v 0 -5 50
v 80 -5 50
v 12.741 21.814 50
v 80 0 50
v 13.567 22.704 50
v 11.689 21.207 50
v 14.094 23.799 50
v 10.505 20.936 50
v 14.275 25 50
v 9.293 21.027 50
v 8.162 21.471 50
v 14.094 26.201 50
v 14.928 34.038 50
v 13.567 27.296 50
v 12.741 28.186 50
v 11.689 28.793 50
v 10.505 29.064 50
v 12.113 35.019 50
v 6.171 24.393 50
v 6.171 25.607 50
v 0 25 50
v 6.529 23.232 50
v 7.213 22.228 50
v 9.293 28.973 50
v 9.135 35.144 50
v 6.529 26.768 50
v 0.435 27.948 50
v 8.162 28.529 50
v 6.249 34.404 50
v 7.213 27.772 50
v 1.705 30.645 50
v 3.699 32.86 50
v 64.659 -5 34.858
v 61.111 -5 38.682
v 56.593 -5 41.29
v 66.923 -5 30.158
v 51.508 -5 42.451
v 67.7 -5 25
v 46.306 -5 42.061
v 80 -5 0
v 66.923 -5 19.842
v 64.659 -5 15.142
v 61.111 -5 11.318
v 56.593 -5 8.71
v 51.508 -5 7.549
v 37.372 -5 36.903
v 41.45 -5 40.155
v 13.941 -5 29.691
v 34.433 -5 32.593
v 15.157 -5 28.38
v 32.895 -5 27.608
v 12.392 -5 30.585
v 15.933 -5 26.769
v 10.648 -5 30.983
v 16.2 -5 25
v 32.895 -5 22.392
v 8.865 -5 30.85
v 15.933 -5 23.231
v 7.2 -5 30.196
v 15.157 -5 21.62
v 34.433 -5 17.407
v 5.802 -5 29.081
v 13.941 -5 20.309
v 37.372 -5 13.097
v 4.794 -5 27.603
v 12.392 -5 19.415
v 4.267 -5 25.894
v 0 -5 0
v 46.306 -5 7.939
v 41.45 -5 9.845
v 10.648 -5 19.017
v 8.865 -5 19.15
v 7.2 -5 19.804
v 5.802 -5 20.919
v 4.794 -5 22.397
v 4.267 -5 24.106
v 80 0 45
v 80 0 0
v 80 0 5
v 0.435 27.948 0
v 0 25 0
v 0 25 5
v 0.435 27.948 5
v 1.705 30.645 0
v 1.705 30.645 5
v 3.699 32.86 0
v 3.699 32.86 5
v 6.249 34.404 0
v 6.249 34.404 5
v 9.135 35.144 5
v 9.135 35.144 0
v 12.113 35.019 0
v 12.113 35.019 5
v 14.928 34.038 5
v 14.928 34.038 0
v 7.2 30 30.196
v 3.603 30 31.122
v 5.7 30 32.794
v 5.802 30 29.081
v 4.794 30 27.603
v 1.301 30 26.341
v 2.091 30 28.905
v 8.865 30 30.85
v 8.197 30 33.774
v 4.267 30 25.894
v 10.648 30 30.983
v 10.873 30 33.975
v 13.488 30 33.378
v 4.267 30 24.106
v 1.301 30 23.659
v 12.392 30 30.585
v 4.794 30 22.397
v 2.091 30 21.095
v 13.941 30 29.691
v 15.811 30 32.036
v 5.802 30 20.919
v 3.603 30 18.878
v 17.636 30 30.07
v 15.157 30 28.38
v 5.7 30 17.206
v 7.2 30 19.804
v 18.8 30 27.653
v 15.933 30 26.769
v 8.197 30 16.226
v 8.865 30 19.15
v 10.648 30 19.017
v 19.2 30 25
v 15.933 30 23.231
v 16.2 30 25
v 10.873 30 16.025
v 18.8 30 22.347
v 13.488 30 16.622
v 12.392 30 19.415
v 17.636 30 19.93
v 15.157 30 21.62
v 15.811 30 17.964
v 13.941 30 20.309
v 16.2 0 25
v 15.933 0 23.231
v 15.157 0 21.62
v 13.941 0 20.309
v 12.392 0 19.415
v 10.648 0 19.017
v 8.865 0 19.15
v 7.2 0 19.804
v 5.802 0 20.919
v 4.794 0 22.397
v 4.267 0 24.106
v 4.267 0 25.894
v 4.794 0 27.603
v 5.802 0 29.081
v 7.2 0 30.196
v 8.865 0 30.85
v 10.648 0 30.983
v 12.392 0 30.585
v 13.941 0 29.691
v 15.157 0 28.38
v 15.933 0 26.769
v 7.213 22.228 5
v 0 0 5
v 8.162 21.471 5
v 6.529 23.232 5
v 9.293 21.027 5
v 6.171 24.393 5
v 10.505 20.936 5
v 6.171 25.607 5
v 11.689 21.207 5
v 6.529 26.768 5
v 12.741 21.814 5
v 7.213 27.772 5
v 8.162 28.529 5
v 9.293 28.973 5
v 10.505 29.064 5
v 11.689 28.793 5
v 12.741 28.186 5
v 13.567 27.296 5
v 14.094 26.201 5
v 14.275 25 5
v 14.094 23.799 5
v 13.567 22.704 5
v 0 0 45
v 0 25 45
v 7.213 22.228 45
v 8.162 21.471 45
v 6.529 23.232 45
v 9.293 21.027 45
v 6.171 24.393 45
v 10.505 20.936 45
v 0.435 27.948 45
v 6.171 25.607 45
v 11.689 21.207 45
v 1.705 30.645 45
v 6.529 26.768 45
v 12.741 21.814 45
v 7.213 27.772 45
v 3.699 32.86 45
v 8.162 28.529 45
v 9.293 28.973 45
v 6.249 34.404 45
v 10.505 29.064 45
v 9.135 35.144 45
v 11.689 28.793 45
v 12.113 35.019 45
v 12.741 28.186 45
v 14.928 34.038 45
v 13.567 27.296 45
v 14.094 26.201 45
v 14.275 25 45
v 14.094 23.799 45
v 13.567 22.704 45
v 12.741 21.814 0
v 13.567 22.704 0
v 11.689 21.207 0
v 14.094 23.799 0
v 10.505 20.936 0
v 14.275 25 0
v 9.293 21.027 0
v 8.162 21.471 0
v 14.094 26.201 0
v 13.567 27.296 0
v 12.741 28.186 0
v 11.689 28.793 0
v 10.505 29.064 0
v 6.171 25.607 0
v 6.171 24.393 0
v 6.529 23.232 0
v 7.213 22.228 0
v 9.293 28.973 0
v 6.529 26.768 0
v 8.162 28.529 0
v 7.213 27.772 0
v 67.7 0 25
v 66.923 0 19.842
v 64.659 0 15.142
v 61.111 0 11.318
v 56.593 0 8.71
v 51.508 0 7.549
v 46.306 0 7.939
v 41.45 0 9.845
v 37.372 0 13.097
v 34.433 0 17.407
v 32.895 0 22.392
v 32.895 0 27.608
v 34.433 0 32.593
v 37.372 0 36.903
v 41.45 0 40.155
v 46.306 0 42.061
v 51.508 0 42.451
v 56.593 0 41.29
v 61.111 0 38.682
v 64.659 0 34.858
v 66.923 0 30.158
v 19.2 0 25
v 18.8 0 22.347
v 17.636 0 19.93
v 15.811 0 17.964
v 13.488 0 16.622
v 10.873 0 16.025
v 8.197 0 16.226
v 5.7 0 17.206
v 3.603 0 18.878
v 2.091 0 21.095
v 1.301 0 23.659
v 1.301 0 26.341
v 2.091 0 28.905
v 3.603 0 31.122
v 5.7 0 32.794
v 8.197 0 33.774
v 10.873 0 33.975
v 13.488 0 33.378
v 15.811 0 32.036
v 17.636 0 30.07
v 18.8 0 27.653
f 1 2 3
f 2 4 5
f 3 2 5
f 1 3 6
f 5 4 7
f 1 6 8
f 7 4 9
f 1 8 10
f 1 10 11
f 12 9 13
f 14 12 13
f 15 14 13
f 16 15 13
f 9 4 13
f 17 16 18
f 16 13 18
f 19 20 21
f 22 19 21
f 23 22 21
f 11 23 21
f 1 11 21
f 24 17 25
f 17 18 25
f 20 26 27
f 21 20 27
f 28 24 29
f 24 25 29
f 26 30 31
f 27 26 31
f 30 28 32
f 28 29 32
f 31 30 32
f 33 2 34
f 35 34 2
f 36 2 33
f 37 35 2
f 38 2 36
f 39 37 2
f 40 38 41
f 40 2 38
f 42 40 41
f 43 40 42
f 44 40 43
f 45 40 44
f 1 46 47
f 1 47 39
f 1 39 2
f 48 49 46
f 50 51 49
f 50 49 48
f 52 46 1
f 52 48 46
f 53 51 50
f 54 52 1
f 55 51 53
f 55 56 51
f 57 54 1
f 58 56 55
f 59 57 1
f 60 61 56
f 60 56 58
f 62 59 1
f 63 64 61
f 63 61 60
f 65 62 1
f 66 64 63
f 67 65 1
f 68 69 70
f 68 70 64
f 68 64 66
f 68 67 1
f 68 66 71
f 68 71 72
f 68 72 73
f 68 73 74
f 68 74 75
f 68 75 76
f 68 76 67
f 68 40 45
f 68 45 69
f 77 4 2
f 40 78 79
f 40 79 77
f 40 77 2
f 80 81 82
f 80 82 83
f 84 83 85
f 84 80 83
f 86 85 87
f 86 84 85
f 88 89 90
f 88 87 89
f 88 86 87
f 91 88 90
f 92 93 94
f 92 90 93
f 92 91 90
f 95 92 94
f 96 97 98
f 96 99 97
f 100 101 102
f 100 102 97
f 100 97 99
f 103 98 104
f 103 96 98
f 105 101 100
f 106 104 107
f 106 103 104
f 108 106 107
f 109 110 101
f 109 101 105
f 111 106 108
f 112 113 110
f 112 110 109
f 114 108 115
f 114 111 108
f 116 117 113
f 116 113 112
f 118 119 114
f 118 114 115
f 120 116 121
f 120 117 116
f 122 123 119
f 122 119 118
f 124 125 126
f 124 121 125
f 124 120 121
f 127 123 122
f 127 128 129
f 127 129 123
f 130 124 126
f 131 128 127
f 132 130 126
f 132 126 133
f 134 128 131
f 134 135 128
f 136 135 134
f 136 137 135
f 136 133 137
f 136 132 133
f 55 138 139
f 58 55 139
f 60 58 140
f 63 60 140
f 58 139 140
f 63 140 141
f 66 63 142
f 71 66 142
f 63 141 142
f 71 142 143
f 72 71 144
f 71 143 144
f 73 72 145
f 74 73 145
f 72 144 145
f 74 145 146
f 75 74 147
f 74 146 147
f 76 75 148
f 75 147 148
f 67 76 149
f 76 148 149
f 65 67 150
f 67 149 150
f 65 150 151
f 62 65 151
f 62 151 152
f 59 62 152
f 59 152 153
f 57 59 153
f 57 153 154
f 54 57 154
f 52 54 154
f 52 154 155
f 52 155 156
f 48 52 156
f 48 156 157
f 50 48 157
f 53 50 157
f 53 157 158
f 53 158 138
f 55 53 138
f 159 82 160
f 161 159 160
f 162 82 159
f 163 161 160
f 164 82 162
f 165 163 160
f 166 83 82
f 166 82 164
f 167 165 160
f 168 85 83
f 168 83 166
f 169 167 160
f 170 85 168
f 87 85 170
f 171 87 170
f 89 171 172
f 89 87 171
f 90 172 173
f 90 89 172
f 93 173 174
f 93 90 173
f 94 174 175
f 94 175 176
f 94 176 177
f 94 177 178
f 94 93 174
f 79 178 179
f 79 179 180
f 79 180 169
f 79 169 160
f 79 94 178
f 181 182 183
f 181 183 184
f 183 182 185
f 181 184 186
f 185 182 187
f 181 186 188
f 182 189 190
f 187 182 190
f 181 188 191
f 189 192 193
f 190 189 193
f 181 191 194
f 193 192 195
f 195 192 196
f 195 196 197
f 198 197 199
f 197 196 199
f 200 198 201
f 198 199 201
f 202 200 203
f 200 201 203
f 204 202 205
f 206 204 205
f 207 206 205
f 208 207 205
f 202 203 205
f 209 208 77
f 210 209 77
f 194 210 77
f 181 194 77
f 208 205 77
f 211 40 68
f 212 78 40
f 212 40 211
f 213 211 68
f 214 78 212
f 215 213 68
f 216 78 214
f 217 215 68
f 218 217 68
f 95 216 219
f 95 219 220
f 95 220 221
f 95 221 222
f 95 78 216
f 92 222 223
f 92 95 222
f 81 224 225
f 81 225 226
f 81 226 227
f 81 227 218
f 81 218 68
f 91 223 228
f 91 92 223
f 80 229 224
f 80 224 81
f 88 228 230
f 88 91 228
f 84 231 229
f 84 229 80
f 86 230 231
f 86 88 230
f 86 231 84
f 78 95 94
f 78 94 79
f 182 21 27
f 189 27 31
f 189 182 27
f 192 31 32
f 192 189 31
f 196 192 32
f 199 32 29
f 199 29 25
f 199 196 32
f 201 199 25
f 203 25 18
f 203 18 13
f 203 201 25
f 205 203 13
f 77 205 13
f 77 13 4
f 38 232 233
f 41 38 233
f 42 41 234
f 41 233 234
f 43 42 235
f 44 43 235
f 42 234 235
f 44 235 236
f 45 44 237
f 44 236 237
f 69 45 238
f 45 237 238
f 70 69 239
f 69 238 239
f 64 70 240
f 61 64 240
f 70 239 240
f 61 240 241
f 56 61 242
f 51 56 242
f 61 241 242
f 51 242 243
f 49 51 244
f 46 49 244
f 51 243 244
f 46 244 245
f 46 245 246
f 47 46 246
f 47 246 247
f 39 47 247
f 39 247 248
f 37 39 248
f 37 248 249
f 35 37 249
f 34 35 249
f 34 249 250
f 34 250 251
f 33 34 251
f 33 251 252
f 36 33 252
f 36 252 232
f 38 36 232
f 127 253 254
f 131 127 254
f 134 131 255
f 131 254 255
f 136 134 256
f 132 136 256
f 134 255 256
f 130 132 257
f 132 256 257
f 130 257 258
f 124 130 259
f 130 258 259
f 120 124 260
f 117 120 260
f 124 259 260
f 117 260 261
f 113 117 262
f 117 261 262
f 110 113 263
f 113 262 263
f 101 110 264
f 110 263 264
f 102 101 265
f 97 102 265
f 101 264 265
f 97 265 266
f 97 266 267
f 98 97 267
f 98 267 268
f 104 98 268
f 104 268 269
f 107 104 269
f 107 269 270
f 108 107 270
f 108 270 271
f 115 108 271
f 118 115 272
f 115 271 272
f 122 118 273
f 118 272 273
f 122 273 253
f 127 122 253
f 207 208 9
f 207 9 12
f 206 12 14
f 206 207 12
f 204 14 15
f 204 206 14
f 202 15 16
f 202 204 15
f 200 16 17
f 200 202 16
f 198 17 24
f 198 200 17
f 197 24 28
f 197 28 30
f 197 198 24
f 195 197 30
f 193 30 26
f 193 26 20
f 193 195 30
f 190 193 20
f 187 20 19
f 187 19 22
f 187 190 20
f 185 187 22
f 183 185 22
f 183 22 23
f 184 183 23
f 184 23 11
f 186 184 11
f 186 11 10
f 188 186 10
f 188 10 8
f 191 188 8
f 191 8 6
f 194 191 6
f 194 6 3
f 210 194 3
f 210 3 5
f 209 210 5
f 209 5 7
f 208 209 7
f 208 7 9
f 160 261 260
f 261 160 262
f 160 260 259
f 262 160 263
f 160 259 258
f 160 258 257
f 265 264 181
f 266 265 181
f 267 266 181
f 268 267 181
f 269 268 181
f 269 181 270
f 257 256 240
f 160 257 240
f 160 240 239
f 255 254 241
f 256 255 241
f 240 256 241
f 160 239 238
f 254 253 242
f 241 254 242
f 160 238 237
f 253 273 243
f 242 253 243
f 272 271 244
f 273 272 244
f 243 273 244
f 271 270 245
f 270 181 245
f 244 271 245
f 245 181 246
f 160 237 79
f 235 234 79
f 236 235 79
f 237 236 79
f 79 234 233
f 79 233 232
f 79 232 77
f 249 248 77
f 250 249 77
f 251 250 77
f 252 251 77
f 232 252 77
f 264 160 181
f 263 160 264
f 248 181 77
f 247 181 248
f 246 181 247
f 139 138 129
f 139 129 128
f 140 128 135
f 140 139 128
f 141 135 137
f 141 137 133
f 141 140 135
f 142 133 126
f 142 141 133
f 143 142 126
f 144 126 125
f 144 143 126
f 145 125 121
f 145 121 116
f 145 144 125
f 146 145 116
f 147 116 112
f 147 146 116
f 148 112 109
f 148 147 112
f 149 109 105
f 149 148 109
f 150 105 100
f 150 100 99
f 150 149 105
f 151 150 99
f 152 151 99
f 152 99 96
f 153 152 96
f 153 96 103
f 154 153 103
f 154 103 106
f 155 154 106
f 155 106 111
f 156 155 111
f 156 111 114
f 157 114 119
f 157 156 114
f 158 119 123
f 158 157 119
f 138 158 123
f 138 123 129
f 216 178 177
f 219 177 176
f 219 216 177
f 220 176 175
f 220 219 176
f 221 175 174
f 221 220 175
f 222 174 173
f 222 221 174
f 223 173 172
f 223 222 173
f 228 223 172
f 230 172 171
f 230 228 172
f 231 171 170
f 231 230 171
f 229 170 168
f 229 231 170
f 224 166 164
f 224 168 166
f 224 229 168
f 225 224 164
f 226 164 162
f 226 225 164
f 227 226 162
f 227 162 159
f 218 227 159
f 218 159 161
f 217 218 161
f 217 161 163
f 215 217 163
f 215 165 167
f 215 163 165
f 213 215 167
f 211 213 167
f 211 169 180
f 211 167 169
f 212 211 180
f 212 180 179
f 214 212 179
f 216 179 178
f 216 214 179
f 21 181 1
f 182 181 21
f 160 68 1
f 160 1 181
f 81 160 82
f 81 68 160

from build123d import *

# Parameters (mm, degrees)
SKETCH3_R           = 4.075
BOSS_EXTRUDE3_DEPTH = 50
CUT_EXTRUDE1_DEPTH  = 40
SKETCH8_R           = 6
SKETCH8_R_2         = 17.5
CUT_EXTRUDE2_DEPTH  = 6
SKETCH9_R           = 9
SKETCH9_R_2         = 6
BOSS_EXTRUDE4_DEPTH = 30


with BuildPart() as part:
    # Sketch3 → Boss-Extrude3 (new body)
    with BuildSketch(Plane.XY):
        with BuildLine():
            Line((0, 0), (0, 25))
            ThreePointArc((0, 25), (4.917135927, 33.725327913), (14.927715135, 34.038180658))
            Line((14.927715135, 34.038180658), (80, 0))
            Line((80, 0), (80, -5))
            Line((80, -5), (0, -5))
            Line((0, -5), (0, 0))
        make_face()
        with Locations((10.2, 25)):
            Circle(SKETCH3_R, mode=Mode.SUBTRACT)
    extrude(amount=BOSS_EXTRUDE3_DEPTH)

    # Sketch6 → Cut-Extrude1 (cut)
    with BuildSketch(Plane.XY.offset(45)):
        with BuildLine():
            Line((0, 25), (0, 0))
            Line((0, 0), (80, 0))
            Line((80, 0), (14.927715135, 34.038180658))
            ThreePointArc((14.927715135, 34.038180658), (4.917135927, 33.725327913), (0, 25))
        make_face()
    extrude(amount=-CUT_EXTRUDE1_DEPTH, mode=Mode.SUBTRACT)

    # Sketch8 → Cut-Extrude2 (cut, through all)
    with BuildSketch(Plane(origin=(0, 0, 0), x_dir=(1, 0, 0), z_dir=(0, 1, 0))):
        with Locations((10.2, -25)):
            Circle(SKETCH8_R)
        with Locations((50.2, -25)):
            Circle(SKETCH8_R_2)
    extrude(amount=-CUT_EXTRUDE2_DEPTH, mode=Mode.SUBTRACT)

    # Sketch9 → Boss-Extrude4 (add)
    with BuildSketch(Plane(origin=(0, 0, 0), x_dir=(1, 0, 0), z_dir=(0, 1, 0))):
        with Locations((10.2, -25)):
            Circle(SKETCH9_R)
        with Locations((10.2, -25)):
            Circle(SKETCH9_R_2, mode=Mode.SUBTRACT)
    extrude(amount=BOSS_EXTRUDE4_DEPTH)


solid = part.part
